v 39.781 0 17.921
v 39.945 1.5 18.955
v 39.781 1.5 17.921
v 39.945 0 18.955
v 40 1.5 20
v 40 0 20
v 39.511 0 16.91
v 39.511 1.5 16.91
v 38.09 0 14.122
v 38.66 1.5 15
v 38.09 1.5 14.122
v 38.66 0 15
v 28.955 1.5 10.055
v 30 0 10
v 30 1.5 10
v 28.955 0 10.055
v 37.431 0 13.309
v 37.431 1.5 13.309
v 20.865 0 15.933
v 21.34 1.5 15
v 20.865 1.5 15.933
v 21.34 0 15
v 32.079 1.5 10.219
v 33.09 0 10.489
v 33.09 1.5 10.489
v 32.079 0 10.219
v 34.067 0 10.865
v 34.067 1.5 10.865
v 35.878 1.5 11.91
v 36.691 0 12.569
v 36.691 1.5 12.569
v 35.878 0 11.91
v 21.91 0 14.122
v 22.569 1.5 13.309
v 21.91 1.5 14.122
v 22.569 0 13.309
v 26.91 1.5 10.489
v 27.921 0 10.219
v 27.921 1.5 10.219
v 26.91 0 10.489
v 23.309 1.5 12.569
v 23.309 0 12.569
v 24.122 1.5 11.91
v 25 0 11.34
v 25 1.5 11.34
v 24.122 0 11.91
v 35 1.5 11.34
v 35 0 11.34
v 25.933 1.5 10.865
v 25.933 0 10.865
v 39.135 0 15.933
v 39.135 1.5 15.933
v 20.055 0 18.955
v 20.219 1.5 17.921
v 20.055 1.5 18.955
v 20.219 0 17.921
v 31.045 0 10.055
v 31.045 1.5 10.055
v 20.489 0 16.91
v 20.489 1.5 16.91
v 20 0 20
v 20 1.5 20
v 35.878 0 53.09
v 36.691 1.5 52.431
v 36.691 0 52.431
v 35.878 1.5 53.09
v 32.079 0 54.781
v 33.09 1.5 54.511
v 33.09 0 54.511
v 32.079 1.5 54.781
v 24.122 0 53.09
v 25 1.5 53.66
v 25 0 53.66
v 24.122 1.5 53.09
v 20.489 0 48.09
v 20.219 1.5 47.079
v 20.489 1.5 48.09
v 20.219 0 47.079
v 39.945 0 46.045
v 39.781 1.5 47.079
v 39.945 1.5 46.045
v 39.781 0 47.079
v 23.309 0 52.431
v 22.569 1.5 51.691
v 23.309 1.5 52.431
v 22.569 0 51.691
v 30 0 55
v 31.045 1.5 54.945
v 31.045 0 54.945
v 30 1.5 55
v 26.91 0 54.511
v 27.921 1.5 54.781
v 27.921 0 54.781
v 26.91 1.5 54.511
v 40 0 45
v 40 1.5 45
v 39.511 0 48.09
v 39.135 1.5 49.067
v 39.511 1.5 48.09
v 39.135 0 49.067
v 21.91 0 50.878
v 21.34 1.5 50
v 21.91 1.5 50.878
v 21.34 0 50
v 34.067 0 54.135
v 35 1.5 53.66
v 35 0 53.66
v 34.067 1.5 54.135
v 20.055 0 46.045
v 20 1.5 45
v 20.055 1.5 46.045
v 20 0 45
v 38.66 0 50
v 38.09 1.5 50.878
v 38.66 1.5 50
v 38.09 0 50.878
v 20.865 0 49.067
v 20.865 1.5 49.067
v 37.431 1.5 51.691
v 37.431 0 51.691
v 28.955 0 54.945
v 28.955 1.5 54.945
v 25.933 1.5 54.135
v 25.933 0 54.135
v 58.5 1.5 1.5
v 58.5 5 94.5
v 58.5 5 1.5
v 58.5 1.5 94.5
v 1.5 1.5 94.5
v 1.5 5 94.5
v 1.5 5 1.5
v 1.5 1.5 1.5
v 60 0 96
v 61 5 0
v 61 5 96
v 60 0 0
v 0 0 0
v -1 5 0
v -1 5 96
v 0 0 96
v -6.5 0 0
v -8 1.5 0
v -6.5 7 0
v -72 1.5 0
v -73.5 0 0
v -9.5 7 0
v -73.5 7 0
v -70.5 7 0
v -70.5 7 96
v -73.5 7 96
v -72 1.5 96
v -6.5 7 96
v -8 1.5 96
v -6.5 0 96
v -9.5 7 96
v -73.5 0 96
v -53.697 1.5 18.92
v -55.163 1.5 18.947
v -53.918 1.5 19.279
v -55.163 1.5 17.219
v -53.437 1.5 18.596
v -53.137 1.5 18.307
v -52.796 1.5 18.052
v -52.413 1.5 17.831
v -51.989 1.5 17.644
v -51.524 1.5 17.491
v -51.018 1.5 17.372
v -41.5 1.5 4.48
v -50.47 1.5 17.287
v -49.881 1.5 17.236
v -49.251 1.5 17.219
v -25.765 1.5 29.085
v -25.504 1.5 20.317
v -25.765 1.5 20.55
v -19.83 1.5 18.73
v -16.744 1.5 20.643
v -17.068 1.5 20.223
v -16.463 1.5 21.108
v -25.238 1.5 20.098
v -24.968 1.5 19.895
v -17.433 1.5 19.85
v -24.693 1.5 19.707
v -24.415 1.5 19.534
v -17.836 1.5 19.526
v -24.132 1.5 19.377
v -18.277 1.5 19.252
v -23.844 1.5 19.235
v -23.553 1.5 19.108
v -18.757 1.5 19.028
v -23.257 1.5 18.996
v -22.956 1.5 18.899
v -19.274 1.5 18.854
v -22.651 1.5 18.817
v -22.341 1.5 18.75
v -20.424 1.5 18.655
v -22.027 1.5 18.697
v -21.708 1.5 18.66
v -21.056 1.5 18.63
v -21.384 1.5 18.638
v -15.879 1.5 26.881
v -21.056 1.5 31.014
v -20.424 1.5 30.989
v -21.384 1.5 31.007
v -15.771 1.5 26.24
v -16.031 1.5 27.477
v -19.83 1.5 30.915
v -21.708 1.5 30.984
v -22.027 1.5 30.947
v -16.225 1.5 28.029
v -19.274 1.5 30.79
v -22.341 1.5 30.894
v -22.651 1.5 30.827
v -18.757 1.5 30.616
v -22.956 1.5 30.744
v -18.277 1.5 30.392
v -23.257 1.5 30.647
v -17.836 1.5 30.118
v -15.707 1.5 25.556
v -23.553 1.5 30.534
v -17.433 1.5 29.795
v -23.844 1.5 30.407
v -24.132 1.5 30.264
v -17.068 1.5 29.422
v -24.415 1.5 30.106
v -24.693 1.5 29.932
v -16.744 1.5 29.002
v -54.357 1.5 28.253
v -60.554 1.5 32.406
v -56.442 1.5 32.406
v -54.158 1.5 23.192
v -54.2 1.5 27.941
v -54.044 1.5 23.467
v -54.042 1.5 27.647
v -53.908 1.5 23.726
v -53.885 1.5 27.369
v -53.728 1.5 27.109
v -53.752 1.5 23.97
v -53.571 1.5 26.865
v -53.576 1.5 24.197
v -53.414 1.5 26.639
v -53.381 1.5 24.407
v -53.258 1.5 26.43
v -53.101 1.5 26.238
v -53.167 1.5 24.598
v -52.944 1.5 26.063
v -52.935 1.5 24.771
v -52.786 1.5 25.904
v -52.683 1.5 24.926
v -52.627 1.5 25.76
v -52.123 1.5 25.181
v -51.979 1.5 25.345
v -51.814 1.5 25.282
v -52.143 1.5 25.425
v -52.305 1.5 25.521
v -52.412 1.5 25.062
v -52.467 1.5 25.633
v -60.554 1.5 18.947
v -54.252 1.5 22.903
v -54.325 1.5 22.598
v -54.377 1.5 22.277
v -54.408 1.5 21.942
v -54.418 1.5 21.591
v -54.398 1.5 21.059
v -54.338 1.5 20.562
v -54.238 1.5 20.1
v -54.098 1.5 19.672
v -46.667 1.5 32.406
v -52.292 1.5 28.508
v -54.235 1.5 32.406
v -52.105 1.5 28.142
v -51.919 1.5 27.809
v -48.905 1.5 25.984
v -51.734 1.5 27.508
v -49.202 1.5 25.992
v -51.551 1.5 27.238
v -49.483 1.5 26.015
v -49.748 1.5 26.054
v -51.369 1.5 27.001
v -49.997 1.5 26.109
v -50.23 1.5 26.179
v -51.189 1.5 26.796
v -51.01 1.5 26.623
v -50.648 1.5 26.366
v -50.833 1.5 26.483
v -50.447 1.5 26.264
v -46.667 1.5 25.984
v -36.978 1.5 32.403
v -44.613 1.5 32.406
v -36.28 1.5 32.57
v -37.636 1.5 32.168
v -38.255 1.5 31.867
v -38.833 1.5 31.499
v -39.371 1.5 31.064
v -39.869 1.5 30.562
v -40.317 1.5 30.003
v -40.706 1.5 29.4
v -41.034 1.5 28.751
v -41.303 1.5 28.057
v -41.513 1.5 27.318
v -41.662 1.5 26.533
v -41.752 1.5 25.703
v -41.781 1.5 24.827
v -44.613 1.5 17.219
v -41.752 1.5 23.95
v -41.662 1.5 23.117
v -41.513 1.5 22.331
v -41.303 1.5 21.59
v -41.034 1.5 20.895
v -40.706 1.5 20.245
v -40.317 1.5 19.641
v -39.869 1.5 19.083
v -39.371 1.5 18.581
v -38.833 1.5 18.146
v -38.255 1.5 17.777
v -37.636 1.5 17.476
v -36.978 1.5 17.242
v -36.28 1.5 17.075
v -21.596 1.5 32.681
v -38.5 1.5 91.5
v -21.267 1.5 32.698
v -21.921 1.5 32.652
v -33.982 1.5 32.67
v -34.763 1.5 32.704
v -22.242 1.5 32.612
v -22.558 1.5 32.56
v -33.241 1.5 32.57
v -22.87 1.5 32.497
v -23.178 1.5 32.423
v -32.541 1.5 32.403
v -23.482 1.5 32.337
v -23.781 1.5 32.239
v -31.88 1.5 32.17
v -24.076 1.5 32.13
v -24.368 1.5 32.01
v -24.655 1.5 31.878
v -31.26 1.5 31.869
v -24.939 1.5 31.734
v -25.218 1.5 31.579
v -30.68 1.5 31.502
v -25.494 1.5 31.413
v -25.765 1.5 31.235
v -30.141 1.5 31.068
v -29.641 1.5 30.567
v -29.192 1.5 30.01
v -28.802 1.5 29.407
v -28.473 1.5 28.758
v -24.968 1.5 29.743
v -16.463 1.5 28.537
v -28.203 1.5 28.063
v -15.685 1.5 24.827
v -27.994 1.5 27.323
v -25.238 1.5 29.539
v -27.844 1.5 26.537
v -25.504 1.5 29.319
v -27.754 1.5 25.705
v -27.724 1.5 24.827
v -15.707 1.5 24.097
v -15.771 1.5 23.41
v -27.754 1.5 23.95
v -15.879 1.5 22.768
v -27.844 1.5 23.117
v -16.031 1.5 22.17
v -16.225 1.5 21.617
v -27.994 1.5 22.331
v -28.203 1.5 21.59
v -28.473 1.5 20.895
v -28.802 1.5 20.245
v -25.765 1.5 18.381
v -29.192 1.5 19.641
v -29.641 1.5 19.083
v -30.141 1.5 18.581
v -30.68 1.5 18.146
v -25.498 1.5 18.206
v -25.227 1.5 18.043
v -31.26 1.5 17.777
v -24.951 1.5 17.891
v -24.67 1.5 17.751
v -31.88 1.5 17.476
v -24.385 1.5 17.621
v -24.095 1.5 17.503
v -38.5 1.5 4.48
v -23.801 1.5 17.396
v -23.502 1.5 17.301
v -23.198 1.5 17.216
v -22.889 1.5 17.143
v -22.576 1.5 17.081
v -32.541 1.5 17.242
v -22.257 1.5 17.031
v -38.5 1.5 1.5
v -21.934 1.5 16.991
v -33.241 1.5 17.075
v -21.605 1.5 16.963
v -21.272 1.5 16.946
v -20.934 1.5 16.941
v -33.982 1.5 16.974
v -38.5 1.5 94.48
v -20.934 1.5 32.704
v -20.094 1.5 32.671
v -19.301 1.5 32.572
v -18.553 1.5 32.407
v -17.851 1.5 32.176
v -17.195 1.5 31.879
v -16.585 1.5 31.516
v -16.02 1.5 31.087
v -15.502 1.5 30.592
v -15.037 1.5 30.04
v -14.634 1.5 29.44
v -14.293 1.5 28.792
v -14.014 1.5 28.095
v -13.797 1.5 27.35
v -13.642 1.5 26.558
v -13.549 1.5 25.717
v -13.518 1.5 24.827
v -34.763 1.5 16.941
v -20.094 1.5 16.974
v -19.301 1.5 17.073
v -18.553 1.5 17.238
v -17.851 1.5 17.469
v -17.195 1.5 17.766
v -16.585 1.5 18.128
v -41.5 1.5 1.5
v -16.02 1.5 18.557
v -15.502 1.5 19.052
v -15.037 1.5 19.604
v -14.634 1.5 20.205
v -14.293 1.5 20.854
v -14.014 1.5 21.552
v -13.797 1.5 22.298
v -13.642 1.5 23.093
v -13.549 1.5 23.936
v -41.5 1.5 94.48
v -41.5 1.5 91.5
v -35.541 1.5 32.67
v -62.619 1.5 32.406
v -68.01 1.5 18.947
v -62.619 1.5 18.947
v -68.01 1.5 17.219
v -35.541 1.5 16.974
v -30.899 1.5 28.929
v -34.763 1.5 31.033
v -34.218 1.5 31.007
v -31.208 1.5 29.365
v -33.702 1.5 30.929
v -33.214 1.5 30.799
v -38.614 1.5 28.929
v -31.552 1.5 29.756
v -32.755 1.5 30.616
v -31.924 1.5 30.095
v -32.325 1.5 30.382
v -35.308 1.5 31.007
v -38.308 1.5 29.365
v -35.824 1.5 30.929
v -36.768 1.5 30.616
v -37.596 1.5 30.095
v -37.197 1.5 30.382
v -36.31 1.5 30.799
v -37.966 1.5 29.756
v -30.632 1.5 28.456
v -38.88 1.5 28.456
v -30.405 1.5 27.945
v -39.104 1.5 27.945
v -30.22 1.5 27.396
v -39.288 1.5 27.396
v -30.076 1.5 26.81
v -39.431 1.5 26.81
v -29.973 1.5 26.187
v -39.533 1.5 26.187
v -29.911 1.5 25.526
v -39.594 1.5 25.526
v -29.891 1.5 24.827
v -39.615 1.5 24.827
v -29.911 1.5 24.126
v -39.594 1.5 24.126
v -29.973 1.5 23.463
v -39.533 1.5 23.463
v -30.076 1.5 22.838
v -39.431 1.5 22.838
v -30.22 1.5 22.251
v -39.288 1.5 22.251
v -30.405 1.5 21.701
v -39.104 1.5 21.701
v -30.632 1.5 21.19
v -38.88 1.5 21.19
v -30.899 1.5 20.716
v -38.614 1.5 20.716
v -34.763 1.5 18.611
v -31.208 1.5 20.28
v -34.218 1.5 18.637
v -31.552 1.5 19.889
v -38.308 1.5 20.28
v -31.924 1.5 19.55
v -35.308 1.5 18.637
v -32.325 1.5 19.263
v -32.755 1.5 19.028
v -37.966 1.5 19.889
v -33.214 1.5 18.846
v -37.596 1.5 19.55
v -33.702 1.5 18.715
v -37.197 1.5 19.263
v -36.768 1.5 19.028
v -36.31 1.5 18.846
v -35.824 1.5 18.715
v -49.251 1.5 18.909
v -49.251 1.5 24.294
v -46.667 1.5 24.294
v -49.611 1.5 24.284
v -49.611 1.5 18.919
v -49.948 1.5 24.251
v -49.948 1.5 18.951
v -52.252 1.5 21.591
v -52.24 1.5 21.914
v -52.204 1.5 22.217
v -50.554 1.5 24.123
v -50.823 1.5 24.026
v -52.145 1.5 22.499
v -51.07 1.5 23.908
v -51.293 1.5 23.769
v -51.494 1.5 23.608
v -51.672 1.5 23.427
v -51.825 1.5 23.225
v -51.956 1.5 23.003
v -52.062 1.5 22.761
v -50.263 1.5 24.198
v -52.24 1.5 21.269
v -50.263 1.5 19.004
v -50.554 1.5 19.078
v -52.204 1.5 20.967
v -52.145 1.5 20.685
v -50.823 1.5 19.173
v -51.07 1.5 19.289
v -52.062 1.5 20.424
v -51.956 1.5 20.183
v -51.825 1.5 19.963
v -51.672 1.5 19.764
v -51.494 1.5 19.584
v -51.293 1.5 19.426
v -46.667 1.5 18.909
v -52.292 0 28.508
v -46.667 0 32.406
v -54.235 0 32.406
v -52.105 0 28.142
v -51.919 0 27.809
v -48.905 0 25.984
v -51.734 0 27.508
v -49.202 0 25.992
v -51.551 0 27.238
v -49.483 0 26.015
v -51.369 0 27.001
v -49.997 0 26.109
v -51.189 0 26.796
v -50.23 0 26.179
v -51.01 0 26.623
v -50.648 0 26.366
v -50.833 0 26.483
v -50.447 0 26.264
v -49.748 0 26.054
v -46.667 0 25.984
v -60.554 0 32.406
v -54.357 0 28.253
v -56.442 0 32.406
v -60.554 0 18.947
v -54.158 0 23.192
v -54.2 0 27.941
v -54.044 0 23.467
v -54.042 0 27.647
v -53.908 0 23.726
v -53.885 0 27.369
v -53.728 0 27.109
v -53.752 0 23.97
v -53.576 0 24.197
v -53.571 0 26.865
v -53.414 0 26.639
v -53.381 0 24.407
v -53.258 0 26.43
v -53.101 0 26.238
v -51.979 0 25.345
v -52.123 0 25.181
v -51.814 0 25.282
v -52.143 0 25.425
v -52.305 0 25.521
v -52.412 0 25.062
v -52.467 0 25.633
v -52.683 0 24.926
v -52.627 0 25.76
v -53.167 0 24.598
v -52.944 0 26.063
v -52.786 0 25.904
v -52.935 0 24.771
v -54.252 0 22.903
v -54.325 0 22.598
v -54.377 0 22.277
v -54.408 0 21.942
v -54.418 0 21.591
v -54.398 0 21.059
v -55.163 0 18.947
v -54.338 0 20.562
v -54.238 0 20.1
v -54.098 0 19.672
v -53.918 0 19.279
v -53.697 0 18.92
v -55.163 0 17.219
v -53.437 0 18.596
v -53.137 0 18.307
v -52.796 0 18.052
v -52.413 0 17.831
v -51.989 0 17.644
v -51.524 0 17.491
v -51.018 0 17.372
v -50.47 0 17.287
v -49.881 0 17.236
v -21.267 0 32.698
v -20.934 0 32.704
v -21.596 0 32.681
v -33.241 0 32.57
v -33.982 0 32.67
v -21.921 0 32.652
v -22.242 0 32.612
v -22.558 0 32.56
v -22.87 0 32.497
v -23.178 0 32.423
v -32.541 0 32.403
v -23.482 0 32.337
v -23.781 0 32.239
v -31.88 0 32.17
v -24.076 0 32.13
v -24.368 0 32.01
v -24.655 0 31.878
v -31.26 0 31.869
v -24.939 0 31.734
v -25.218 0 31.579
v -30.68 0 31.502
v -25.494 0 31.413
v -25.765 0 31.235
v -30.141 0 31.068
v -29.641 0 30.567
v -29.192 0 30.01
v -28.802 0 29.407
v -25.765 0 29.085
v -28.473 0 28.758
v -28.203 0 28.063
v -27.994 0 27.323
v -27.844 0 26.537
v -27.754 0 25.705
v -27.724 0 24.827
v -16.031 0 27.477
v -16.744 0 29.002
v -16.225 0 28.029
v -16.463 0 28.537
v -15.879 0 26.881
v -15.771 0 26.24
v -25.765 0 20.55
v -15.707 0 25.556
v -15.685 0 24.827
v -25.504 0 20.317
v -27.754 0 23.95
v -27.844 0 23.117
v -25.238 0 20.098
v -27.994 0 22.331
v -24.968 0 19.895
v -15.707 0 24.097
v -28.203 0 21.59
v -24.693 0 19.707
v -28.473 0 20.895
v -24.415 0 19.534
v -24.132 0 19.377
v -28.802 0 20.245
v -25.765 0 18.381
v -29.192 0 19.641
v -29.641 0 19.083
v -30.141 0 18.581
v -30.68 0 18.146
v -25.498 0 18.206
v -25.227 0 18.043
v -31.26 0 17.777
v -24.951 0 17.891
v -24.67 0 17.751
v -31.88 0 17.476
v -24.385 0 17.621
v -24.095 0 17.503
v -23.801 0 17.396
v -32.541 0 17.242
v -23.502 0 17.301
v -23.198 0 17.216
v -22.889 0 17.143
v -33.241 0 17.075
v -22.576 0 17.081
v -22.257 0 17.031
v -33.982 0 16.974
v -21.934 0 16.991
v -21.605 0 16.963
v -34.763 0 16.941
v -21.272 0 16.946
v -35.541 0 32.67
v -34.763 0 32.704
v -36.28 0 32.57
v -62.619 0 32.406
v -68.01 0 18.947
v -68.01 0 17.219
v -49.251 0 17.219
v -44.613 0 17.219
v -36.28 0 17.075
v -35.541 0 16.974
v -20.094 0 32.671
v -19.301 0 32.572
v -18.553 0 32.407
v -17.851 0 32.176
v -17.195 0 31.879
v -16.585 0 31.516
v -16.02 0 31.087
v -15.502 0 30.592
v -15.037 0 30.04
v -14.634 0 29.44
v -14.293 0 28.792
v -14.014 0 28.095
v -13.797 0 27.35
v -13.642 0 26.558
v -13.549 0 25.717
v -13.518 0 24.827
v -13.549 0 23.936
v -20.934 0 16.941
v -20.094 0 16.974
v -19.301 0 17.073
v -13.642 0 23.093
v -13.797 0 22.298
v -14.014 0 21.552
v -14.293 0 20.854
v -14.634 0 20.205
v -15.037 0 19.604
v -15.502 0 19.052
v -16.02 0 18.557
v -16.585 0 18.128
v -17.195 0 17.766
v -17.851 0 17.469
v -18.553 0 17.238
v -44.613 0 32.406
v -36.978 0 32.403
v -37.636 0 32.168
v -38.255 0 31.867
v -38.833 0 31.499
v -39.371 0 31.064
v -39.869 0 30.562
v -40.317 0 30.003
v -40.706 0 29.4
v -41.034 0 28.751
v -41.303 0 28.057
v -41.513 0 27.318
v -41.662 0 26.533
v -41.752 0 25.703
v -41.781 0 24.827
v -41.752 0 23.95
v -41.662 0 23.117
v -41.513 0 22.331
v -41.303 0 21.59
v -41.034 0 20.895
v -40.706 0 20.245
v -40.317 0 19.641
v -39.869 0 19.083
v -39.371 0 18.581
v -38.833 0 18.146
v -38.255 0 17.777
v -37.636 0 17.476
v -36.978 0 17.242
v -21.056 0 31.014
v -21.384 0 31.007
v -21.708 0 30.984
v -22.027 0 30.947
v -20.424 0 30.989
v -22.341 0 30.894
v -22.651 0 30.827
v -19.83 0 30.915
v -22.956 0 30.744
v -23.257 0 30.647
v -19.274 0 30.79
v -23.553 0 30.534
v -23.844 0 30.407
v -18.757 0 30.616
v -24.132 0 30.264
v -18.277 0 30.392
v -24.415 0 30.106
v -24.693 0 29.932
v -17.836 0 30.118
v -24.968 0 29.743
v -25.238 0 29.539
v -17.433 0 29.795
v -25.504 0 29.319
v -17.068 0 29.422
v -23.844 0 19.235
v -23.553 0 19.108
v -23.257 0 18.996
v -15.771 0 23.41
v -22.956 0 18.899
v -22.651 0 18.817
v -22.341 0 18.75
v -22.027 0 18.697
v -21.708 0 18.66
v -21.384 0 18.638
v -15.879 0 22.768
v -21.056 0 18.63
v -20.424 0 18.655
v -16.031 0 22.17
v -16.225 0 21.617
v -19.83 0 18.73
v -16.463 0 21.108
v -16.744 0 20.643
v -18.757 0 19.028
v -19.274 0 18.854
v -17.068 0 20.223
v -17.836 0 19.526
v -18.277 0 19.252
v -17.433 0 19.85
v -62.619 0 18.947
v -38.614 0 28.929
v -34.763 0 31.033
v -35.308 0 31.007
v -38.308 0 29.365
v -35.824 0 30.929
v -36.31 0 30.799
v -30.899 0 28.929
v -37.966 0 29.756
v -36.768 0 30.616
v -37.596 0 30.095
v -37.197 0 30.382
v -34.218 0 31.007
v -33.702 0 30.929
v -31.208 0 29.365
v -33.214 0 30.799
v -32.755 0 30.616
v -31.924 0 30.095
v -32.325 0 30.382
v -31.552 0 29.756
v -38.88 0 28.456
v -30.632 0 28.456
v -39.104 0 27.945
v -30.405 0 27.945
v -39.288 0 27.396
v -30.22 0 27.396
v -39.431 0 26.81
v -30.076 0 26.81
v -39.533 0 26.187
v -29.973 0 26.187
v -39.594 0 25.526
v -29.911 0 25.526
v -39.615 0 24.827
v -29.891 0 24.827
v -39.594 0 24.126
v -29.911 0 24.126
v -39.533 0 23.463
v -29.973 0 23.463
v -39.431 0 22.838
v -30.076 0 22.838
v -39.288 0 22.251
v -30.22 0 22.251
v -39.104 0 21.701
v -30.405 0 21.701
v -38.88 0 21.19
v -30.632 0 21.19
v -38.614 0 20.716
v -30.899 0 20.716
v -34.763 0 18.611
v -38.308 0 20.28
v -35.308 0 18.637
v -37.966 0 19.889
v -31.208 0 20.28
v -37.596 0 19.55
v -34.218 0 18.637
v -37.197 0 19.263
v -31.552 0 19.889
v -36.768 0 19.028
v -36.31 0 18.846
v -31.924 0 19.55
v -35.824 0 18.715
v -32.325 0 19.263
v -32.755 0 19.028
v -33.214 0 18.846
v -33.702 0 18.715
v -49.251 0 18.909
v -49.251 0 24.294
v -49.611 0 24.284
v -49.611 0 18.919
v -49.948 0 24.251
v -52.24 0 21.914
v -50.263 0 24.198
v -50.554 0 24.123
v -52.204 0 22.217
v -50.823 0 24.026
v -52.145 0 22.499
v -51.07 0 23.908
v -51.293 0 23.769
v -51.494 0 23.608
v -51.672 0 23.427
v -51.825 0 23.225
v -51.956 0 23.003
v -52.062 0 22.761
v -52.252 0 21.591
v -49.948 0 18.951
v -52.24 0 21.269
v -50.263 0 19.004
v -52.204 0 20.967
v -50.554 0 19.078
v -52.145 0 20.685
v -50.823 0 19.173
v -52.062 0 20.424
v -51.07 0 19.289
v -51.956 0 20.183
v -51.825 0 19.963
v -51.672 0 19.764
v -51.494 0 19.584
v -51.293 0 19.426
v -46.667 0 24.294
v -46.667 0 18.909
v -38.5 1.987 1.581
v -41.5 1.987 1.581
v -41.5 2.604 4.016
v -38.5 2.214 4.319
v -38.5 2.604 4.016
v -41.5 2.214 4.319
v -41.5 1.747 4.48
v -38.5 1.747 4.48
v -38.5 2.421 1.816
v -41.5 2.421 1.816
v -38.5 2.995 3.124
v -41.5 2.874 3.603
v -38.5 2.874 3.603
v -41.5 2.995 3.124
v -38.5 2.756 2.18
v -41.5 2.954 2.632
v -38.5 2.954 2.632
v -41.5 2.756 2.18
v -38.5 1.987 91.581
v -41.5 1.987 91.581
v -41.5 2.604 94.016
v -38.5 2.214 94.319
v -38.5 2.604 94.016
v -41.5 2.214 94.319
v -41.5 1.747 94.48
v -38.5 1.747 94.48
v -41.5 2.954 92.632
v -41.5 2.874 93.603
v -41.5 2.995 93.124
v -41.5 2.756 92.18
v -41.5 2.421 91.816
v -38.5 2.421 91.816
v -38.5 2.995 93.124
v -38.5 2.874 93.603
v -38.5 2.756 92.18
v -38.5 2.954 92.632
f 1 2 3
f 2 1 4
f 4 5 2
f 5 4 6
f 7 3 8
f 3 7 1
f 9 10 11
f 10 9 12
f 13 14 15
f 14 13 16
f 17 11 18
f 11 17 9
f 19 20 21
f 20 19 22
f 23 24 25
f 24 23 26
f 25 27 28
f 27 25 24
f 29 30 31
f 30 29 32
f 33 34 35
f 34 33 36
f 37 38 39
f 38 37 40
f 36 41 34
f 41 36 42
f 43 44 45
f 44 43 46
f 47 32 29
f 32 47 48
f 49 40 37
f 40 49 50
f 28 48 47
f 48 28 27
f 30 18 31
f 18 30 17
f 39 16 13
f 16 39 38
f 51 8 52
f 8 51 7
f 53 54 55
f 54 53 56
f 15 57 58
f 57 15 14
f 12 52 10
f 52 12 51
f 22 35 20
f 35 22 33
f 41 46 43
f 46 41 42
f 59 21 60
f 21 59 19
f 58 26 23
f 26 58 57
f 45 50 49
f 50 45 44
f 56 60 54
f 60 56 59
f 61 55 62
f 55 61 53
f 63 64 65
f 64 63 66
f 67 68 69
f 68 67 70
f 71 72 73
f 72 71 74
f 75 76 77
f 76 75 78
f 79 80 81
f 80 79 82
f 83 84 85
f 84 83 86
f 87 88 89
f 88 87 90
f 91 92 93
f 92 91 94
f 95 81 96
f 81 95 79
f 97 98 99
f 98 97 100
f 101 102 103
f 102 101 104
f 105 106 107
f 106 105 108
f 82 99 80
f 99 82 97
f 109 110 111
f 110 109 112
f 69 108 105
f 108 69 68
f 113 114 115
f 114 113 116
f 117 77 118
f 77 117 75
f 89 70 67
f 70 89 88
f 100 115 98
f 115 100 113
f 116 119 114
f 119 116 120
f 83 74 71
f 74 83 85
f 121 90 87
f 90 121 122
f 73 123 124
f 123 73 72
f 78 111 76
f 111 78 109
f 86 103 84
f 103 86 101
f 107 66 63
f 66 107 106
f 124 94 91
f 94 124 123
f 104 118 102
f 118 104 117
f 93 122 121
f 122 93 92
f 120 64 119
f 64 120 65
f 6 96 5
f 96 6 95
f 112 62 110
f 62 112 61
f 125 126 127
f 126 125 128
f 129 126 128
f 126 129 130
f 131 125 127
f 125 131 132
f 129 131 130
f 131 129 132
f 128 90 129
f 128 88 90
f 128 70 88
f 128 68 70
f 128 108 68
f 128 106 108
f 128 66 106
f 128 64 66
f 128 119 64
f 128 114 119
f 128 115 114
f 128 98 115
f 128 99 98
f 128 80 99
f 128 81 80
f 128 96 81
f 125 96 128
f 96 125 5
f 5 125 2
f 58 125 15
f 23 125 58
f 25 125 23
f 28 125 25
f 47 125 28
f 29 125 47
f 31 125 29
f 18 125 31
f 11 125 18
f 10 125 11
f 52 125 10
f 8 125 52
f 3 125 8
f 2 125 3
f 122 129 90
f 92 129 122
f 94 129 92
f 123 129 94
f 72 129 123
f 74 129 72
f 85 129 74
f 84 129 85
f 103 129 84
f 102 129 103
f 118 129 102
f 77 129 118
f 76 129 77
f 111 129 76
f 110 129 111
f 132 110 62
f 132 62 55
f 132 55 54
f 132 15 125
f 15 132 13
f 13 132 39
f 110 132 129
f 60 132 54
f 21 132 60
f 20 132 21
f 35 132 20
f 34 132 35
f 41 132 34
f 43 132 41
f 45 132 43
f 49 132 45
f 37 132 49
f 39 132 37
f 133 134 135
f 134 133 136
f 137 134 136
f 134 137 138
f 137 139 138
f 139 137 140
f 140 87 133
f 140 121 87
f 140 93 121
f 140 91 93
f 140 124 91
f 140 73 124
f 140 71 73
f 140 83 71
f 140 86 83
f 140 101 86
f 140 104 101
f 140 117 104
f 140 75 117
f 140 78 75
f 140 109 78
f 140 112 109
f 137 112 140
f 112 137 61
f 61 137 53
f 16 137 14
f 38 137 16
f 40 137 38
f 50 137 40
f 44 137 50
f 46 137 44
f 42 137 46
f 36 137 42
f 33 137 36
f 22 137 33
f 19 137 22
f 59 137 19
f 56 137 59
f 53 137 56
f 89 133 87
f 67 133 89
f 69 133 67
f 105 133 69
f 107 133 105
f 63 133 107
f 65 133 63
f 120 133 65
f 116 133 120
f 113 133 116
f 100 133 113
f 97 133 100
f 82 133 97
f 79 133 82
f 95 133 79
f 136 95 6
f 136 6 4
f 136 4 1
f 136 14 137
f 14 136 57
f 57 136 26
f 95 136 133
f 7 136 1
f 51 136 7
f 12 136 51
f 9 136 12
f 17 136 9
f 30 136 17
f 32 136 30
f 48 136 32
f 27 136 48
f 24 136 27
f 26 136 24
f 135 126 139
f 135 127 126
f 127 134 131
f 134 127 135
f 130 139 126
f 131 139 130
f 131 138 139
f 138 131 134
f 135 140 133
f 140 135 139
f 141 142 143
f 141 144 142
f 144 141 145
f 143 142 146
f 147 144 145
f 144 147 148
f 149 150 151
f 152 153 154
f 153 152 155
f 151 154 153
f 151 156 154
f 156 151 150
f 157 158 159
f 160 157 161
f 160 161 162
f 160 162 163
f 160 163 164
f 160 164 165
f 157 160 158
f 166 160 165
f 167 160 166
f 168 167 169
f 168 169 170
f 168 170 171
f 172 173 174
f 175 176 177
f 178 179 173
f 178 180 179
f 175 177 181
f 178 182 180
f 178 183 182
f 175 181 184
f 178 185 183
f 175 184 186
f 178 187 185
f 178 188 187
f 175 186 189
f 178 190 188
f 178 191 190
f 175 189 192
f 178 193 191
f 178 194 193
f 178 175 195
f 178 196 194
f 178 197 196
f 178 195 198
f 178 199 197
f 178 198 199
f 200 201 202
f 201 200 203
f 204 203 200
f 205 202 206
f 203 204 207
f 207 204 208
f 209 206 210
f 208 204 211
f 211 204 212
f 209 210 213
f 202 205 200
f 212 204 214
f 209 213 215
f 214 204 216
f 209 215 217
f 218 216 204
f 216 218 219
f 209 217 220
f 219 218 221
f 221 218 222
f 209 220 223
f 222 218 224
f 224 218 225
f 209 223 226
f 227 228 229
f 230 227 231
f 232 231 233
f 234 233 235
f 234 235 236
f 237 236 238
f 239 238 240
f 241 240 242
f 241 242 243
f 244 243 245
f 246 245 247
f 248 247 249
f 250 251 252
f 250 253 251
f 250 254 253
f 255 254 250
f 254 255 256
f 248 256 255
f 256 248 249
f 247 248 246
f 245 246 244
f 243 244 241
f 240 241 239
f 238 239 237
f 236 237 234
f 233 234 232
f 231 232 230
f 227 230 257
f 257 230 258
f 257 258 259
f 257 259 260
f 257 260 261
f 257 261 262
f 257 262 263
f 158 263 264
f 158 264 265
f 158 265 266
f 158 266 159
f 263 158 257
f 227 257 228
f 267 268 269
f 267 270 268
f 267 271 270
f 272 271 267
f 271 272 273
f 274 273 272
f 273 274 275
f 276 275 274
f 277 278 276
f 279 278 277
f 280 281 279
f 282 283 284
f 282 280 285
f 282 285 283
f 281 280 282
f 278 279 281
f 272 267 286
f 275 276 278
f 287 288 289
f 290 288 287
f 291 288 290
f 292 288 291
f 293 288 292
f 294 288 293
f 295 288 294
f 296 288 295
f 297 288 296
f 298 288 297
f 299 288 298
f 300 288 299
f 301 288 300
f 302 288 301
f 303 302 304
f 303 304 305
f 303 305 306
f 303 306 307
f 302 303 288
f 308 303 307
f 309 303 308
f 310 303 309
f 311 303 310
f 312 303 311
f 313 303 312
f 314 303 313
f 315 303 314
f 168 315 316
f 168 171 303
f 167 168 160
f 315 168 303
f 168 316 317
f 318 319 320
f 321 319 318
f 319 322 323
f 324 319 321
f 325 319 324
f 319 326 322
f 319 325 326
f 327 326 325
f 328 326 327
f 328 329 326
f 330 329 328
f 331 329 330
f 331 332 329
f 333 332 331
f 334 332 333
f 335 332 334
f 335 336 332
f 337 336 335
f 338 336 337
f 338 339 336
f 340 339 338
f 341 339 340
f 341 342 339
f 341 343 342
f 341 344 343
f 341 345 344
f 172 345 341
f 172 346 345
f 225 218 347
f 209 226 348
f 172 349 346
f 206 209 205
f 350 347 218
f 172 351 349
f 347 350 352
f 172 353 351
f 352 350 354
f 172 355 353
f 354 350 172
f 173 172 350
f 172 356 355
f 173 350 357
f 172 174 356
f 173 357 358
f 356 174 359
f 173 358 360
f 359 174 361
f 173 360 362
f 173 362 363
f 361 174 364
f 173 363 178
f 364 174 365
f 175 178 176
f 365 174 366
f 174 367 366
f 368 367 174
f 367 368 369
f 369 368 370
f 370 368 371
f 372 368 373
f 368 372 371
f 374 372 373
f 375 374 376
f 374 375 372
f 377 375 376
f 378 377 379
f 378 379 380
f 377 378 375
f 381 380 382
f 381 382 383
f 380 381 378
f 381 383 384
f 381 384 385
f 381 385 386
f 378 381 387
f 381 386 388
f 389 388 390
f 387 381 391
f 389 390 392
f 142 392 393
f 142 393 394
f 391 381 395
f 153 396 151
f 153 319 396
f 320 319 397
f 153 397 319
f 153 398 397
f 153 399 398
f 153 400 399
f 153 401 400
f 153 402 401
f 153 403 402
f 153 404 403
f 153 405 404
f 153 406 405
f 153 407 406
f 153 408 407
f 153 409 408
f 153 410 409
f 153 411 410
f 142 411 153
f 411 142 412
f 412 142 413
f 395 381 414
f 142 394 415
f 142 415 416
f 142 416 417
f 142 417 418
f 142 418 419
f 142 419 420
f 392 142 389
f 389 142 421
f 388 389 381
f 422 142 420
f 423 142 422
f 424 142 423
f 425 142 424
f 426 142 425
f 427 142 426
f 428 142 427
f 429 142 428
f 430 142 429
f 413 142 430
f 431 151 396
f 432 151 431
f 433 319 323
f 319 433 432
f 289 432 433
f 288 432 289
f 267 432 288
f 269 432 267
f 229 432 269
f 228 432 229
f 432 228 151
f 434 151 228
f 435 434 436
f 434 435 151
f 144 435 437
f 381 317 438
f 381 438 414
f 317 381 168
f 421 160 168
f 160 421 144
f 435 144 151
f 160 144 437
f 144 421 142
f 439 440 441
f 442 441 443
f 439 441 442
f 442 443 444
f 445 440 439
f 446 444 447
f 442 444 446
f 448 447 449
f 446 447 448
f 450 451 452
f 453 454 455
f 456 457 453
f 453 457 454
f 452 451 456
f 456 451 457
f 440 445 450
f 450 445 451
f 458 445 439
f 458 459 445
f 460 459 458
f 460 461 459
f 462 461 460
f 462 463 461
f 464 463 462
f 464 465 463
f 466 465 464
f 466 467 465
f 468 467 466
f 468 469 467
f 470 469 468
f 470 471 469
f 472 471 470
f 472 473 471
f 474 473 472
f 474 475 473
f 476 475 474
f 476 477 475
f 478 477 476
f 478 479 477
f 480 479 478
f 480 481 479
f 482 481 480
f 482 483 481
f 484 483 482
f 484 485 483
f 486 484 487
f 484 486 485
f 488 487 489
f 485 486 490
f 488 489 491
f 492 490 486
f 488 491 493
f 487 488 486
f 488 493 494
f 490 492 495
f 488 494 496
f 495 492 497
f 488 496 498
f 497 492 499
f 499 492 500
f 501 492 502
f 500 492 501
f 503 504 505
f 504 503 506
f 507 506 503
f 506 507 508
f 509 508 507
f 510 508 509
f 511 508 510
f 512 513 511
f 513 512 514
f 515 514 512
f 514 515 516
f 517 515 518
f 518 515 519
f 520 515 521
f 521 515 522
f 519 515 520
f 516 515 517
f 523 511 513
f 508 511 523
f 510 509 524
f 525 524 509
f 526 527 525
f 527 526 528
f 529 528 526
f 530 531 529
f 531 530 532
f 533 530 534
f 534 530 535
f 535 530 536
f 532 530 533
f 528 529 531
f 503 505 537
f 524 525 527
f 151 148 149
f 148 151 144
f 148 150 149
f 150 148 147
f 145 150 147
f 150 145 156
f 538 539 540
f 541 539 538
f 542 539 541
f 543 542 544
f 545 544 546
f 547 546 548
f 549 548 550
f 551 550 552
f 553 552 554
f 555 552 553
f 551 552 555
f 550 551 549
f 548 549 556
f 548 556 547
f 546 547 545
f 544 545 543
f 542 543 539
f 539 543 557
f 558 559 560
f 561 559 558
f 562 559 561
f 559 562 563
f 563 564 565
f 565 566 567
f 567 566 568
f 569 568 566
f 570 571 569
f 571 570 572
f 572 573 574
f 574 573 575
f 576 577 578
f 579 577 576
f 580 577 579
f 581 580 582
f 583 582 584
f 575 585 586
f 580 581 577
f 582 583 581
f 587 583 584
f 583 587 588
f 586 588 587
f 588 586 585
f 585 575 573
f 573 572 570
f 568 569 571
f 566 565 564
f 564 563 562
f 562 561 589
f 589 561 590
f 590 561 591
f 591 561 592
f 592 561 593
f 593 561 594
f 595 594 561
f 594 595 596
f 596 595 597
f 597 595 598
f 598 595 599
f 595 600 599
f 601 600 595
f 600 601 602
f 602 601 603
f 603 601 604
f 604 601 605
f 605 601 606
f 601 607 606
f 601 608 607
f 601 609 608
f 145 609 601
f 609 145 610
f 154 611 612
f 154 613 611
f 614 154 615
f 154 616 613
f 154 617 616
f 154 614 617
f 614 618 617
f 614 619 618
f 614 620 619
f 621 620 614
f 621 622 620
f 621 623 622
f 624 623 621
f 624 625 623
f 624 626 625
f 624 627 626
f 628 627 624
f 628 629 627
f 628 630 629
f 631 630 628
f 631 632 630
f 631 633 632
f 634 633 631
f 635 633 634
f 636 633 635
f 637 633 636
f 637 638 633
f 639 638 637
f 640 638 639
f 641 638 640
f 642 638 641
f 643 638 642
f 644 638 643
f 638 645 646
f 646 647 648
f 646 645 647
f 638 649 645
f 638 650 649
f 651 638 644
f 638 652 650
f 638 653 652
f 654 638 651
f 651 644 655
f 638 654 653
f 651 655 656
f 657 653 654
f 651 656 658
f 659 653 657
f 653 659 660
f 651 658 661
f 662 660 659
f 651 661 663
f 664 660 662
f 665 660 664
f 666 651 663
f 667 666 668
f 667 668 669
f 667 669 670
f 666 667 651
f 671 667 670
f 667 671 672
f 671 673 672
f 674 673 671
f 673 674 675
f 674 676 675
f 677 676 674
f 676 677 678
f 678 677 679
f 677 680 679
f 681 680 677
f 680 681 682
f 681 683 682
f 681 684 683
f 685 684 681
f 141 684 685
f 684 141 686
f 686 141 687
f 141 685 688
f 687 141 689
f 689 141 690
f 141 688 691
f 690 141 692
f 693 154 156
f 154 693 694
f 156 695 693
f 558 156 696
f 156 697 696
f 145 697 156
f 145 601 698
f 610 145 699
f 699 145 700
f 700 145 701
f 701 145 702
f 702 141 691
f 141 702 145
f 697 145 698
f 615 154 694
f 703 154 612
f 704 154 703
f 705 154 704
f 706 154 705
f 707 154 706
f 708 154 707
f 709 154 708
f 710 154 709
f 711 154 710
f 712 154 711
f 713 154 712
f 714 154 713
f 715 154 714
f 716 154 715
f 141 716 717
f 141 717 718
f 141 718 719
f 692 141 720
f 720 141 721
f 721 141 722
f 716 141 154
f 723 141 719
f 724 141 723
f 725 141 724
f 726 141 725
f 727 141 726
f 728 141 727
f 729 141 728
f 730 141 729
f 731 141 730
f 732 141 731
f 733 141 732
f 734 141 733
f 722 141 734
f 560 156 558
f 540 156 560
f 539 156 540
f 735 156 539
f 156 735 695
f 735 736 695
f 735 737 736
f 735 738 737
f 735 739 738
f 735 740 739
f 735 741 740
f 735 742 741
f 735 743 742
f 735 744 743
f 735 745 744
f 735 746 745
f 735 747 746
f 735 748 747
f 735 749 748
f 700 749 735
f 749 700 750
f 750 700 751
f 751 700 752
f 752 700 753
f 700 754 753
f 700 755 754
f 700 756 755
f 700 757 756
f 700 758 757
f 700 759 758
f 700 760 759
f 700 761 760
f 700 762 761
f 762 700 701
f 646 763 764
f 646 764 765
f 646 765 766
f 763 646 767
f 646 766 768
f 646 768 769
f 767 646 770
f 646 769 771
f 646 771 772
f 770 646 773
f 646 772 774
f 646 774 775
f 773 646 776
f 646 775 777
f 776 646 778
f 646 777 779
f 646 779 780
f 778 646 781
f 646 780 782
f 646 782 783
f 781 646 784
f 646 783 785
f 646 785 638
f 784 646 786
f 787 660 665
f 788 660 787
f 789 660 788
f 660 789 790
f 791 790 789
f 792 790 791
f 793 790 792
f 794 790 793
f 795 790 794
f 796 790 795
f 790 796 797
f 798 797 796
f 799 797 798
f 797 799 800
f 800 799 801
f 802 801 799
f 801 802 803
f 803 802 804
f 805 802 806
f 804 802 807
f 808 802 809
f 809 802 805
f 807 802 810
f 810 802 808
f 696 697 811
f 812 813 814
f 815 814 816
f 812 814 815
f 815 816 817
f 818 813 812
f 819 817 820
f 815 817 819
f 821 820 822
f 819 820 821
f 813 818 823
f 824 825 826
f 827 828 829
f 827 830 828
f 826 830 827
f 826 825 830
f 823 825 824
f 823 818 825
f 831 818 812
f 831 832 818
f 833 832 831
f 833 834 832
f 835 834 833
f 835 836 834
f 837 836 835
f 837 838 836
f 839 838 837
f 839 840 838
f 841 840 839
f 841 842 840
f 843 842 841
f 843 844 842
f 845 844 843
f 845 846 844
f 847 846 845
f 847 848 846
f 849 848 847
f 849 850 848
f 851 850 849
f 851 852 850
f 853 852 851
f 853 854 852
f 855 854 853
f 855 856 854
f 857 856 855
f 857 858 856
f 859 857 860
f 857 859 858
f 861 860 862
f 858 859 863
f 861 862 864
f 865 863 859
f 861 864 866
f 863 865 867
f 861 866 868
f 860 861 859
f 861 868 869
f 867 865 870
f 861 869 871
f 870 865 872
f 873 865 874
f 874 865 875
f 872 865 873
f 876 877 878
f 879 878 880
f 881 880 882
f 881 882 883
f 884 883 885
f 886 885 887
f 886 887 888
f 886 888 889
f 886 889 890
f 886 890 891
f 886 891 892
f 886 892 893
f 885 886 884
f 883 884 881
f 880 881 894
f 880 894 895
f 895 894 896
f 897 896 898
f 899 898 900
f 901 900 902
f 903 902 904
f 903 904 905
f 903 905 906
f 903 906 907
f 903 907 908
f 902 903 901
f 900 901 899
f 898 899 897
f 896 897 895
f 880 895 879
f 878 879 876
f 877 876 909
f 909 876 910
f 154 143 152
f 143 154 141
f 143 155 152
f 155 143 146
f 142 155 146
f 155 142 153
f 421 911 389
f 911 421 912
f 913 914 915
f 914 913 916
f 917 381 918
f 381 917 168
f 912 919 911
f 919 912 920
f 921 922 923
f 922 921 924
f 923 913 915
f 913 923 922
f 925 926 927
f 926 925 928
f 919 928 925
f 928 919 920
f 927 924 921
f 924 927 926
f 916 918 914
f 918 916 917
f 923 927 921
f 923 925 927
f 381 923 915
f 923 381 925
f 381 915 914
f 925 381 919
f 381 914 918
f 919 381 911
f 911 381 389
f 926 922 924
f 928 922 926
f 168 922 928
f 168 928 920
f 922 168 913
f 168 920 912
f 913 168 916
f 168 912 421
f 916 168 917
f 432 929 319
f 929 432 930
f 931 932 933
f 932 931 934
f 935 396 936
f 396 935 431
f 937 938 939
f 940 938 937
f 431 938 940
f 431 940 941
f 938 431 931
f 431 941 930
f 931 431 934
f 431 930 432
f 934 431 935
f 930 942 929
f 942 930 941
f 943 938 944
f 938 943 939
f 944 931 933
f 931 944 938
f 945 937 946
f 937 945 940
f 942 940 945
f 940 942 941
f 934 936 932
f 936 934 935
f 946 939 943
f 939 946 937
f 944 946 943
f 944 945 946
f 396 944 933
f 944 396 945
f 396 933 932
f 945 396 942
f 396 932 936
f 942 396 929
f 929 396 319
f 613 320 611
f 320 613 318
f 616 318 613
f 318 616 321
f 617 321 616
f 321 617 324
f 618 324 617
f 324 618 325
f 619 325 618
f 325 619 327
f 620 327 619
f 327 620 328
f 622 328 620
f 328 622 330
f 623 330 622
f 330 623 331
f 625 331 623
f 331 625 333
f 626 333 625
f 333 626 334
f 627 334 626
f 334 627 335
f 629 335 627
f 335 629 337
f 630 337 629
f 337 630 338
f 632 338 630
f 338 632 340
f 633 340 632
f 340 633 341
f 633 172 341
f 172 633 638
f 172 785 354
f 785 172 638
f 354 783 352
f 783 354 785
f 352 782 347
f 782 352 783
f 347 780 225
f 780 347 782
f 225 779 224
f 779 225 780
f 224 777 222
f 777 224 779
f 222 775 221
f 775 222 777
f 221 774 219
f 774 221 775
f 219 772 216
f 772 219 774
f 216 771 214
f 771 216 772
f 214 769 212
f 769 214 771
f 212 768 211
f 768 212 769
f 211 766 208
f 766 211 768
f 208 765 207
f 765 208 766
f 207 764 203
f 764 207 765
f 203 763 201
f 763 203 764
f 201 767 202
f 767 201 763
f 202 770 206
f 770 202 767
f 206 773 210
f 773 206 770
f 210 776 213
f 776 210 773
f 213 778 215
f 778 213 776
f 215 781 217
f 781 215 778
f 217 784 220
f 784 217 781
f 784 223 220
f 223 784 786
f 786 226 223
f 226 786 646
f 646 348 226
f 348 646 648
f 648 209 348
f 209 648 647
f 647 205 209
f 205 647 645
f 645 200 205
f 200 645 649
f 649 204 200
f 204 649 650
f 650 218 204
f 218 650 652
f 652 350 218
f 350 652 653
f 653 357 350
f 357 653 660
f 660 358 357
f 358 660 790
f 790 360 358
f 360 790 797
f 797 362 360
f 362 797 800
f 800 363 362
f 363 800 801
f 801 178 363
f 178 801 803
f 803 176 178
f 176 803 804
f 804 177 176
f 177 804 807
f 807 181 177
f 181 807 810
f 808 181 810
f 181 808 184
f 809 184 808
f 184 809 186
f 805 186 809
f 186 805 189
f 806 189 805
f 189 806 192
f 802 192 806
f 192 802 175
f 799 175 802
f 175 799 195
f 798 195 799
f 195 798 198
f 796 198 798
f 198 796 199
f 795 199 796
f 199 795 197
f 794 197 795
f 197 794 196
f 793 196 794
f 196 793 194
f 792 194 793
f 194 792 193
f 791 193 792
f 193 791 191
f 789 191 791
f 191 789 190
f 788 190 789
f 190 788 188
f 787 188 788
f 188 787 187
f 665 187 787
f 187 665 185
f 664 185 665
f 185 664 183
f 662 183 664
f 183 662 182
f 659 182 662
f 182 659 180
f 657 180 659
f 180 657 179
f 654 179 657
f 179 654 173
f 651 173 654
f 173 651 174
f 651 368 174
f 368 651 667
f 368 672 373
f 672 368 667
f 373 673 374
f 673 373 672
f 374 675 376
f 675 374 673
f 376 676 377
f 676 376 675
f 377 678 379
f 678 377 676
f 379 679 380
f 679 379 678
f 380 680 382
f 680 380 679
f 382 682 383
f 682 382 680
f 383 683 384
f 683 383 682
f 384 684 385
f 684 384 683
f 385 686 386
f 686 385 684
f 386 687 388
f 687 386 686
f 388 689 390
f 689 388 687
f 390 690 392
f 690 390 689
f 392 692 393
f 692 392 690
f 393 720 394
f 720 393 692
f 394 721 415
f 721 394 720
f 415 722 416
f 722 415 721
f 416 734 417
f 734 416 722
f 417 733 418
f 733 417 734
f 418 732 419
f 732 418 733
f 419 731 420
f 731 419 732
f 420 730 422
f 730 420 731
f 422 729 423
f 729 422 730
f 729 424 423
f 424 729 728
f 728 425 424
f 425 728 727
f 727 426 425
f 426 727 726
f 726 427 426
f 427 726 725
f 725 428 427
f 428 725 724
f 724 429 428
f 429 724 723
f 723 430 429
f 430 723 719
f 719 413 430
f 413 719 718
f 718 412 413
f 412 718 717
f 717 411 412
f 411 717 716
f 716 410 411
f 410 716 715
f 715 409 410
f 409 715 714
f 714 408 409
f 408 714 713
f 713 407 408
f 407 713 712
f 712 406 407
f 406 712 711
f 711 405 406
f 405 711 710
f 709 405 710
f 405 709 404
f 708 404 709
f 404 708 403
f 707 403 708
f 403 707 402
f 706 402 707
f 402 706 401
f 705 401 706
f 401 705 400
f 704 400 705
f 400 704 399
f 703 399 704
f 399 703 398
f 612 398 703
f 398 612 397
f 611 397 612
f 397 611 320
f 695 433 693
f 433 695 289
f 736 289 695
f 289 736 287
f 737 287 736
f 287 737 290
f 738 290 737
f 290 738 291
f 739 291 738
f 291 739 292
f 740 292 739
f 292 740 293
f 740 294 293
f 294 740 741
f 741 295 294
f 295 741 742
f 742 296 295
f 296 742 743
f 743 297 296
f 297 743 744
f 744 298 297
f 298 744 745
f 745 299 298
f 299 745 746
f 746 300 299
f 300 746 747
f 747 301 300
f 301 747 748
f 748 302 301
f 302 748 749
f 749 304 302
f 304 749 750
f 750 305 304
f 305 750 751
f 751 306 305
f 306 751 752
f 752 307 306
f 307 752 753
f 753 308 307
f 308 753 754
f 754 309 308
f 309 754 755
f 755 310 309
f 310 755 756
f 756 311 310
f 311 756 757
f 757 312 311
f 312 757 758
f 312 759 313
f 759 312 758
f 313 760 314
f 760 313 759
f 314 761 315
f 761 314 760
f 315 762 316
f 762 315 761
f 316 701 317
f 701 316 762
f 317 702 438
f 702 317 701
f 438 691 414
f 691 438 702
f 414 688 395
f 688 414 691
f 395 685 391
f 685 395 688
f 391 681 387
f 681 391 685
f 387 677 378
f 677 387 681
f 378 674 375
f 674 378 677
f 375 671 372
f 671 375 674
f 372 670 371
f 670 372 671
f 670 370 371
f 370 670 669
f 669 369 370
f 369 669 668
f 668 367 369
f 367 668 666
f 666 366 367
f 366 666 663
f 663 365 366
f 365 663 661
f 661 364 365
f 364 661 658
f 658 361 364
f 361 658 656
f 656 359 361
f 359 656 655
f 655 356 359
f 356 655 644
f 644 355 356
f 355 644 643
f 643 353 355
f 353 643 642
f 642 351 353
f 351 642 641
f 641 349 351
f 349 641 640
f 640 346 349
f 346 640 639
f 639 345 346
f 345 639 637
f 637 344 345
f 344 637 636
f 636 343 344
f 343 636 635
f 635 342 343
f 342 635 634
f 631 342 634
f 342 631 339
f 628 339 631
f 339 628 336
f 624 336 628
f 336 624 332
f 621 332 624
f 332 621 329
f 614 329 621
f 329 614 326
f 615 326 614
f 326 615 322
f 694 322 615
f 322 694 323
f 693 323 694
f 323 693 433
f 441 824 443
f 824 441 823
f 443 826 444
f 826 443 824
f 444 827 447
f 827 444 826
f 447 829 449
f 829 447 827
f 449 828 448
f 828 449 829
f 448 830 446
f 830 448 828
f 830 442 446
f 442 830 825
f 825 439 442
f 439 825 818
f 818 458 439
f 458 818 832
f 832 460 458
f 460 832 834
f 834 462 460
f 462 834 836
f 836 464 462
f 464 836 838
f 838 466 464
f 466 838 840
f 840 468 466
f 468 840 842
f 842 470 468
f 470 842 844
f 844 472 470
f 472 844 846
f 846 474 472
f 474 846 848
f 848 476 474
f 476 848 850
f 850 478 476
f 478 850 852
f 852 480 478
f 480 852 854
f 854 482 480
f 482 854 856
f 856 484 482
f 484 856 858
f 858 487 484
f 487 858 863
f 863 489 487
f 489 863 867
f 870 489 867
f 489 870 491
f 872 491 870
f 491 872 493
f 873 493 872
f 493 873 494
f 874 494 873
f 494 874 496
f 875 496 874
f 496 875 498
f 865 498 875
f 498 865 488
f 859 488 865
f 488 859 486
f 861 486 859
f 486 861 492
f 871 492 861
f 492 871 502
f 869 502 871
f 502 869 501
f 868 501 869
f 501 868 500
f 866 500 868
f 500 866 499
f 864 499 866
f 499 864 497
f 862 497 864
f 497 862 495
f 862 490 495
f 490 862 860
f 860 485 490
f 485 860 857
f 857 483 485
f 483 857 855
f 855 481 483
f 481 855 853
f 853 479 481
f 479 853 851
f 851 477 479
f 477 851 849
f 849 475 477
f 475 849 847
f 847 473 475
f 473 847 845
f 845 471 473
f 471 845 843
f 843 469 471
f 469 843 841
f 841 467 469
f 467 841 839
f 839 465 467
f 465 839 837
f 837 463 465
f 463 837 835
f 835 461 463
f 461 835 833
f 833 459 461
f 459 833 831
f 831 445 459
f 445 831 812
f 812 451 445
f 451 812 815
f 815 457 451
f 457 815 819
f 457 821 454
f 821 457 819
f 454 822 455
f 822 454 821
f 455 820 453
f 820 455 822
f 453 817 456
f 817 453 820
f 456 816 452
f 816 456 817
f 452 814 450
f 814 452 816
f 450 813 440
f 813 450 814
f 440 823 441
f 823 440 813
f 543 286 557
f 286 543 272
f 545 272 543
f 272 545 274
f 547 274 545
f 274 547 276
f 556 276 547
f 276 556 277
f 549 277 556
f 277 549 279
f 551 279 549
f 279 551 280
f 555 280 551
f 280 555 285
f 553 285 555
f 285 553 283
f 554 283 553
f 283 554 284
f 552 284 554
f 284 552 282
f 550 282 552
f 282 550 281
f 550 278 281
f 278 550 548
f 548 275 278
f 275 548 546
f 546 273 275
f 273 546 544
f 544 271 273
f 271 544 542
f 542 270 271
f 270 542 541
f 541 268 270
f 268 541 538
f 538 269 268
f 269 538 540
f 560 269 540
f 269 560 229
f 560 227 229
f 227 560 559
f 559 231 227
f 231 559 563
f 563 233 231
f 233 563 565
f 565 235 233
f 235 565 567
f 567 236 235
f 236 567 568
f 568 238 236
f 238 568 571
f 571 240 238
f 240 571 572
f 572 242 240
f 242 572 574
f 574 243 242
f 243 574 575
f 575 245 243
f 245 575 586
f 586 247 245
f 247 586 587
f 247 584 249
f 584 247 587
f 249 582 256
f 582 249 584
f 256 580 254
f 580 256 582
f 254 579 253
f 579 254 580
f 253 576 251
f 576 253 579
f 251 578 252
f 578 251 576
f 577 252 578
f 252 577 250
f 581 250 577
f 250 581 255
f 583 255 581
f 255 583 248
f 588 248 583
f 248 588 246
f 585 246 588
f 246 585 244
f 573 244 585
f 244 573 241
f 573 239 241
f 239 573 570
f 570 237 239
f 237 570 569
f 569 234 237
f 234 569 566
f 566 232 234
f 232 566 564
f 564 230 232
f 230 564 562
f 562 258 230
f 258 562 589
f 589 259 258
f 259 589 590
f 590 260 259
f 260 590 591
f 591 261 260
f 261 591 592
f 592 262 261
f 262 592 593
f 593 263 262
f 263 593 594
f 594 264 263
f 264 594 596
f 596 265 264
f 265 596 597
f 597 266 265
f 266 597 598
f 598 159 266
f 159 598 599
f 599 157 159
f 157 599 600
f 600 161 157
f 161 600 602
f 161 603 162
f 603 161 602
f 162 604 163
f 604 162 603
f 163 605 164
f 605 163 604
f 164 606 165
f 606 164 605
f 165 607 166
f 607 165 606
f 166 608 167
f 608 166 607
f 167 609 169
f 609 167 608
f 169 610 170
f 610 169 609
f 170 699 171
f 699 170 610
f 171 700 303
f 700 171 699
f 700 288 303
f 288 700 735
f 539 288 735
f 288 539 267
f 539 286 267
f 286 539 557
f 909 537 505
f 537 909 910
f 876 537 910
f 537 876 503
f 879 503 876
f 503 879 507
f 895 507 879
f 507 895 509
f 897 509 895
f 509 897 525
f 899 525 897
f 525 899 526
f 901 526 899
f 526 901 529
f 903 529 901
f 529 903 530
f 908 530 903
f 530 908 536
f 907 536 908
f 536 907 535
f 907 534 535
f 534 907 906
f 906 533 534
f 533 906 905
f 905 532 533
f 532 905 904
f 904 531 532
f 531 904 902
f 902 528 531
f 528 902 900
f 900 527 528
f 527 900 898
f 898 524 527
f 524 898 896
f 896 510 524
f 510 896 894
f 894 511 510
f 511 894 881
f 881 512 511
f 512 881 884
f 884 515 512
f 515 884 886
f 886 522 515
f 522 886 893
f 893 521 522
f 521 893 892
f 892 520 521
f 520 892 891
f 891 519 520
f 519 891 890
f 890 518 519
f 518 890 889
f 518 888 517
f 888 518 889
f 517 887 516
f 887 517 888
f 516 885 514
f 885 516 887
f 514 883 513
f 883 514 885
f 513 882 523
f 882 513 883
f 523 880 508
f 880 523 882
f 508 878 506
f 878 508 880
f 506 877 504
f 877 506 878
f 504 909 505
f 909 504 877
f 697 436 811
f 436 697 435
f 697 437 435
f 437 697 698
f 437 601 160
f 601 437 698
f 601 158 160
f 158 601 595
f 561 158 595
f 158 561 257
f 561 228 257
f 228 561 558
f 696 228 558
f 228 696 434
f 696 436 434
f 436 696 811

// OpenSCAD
// Length of your business card. I would recommend giving an extra 1mm buffer over what you measured.
CardLength = 93;
// Breadth of your business card. I would recommend giving an extra 1mm buffer over what you measured.
CardBreadth = 57;
// Text
Text = "CORT";
// Font size
FontSize = 15;
// Clearance affects how tightly the two halves fit together. The smaller it is, the tighter it'll fit
Clearance = 0.5;

/* [Hidden] */
$fa = 6;
$fs = 0.5;

difference() {
    linear_extrude(height=CardLength+3)
        polygon([[0,0], [CardBreadth+3,0], [CardBreadth+4,5], [-1,5]]);
    union() {
        translate([1.5,1.5,1.5])
            cube([CardBreadth, 3.6, CardLength]);
        translate([(CardBreadth+3)/2,-0.1,20])
            rotate([-90,0,0])
                union() {
                    cylinder(h=2, r=10);
                    translate([0,-25,0])
                        cylinder(h=2, r=10);
                    translate([-10,-25,0])
                        cube([20,25,2]);
                }
    }
}
//
translate([-10,7,0])
rotate([0,0,180])
difference() {
    union() {
        linear_extrude(height=CardLength+3)
            polygon([
                [-3.5,7], [-3.5,0], [-1*Clearance,0], [-2,5.5], 
                [CardBreadth+5,5.5], [CardBreadth+3+Clearance,0], [CardBreadth+6.5,0], [CardBreadth+6.5,7]
            ]);
        translate([(CardBreadth+3)/2,5.5,3])
        rotate([0,90,0])
        cylinder(h=3, r=1.5, center=true);
        translate([(CardBreadth+3)/2,5.5,CardLength])
        rotate([0,90,0])
        cylinder(h=3, r=1.5, center=true);
    }
    translate([(CardBreadth+3)/2, 5.1, 25])
        rotate([-90,0,0])
            linear_extrude(height=2)
                text(Text, font="Stencilia\\-A:style=Regular", size=FontSize, halign="center", valign="center");    
}
